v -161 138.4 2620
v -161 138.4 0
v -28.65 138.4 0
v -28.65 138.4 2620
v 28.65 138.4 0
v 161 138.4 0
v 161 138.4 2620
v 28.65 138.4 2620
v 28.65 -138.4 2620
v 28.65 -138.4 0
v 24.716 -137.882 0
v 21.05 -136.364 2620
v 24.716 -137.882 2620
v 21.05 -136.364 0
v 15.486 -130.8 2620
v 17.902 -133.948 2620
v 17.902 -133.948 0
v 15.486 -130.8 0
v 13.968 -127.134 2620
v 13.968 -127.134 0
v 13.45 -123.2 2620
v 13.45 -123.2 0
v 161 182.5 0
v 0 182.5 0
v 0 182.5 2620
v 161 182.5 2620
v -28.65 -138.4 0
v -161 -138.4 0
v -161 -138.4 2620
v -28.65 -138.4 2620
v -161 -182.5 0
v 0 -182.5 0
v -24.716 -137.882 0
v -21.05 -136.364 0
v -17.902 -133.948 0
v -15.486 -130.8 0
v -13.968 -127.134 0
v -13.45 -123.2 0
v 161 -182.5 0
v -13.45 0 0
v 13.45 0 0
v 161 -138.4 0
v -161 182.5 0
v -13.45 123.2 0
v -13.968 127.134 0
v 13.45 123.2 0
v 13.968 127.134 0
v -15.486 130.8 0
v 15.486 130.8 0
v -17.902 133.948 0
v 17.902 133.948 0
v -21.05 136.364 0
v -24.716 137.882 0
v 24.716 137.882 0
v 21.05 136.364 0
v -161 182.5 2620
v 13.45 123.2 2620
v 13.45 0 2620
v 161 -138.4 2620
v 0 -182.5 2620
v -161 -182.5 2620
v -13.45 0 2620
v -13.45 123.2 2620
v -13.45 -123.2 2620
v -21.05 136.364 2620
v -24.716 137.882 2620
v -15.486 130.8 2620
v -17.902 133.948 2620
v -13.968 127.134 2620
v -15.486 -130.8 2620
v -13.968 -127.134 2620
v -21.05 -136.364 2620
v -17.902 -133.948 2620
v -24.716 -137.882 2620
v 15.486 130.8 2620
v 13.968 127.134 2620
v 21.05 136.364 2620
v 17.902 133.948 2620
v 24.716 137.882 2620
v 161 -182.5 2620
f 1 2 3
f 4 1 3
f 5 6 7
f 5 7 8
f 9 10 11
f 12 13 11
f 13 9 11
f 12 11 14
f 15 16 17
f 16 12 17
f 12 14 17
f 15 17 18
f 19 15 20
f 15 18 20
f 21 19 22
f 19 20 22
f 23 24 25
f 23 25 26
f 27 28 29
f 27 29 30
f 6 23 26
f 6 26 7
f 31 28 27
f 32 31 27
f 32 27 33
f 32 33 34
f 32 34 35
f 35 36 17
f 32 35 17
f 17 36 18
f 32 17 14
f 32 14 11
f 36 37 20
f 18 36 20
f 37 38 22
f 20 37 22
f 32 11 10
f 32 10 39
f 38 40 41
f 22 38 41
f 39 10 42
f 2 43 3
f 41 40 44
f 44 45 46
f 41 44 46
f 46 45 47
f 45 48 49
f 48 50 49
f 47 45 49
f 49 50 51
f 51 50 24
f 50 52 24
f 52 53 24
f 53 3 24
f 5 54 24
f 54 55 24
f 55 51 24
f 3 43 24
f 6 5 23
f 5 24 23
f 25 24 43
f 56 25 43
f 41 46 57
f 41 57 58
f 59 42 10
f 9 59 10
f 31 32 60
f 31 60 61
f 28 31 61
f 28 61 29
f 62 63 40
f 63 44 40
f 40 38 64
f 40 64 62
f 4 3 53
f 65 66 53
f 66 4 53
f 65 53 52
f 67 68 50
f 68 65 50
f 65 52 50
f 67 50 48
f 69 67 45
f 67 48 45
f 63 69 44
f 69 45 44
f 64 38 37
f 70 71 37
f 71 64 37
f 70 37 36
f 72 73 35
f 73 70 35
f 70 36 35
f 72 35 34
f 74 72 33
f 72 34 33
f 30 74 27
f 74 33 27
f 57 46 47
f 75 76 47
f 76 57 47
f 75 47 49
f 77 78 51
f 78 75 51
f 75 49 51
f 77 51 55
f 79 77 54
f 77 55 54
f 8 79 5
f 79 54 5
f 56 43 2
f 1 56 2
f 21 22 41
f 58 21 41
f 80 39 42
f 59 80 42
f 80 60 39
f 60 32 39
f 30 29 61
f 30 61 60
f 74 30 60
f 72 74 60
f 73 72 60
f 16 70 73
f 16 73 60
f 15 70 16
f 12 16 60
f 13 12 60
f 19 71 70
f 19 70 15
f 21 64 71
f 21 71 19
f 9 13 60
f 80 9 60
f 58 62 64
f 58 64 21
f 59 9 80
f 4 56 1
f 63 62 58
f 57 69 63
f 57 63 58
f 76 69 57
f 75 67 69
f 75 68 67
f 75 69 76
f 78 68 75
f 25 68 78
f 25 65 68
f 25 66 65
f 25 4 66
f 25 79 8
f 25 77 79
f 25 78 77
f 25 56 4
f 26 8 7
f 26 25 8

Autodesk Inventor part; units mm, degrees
ref_plane "YZ Plane" through (0, 0, 0) normal (1, 0, 0) x (0, 1, 0)
ref_plane "Start plane" through (0, 0, 0) normal (0, 0, 1) x (1, 0, 0)
ref_plane "End plane" through (0, 0, 2620) normal (0, 0, 1) x (1, 0, 0)
sketch "Sketch" plane through (0, 0, 0) normal (0, 0, 1) x (1, 0, 0)
  line L0 (-161, -182.5) -> (-161, -138.4)
  line L1 (-161, -138.4) -> (-28.65, -138.4)
  line L2 (-13.45, -123.2) -> (-13.45, 0)
  line L3 (-13.45, 0) -> (0, 0) construction
  line L4 (0, 0) -> (0, -182.5) construction
  line L5 (0, -182.5) -> (-161, -182.5)
  line L6 (-60, 0) -> (80, 0) construction
  line L7 (0, -60) -> (0, 80) construction
  line L8 (161, -182.5) -> (161, -138.4)
  line L9 (161, -138.4) -> (28.65, -138.4)
  line L10 (13.45, -123.2) -> (13.45, 0)
  line L11 (13.45, 0) -> (0, 0) construction
  line L12 (0, -182.5) -> (161, -182.5)
  line L13 (-161, 182.5) -> (-161, 138.4)
  line L14 (-161, 138.4) -> (-28.65, 138.4)
  line L15 (-13.45, 123.2) -> (-13.45, 0)
  line L16 (0, 182.5) -> (-161, 182.5)
  line L17 (161, 182.5) -> (161, 138.4)
  line L18 (161, 138.4) -> (28.65, 138.4)
  line L19 (0, 182.5) -> (161, 182.5)
  line L20 (13.45, 123.2) -> (13.45, 0)
  arc A0 (-13.45, 123.2) -> (-28.65, 138.4) centre (-28.65, 123.2) ccw
  arc A1 (28.65, 138.4) -> (13.45, 123.2) centre (28.65, 123.2) ccw
  arc A2 (13.45, -123.2) -> (28.65, -138.4) centre (28.65, -123.2) ccw
  arc A3 (-28.65, -138.4) -> (-13.45, -123.2) centre (-28.65, -123.2) ccw
  line L21 (0, 108) -> (0, -88) construction
  line L22 (-88, 0) -> (108, 0) construction
  point P0 (-13.45, -138.4)
  point P1 (13.45, -138.4)
  point P2 (-13.45, 138.4)
  point P3 (13.45, 138.4)
  dimension "d1" = 182.5
  dimension "d2" = 44.1
  dimension "d3" = 161
  dimension "d4" = 13.45
  dimension "d10" = 15.2
extrude "Body" add sketch "Sketch" along normal up to surface (2620 mm away) from surface at 0
sketch "Sketch4" plane through (0, 0, 0) normal (0, 0, 1) x (1, 0, 0)
  line L0 (0, 0) -> (10, 0)
ref_plane "Work Plane3" through (0, 0, 0) normal (0, -1, 0) x (1, 0, 0)
sketch "Sketch5" plane through (0, 0, 0) normal (0, -1, 0) x (1, 0, 0)
  line L0 (-2, 0) -> (12, 0) projected
  line L1 (-2, 2620) -> (12, 2620) projected
  dimension "d14" = 2620
equation "\"d1\" = 0.5 * G_H"
equation "\"d2\" = G_T1"
equation "\"d3\" = 0.5 * G_W"
equation "\"d4\" = 0.5 * G_T"
equation "\"d10\" = G_IR"
equation "\"d5\" = G_L"
equation "\"G_W\" = 322"
equation "\"G_H\" = 365"
equation "\"G_T\" = 26.9"
equation "\"G_T1\" = 44.1"
equation "\"G_IR\" = 15.2"
equation "\"G_L\" = d14"
equation "\"G_OFFSET_START\" = 0"
equation "\"G_OFFSET_END\" = 0"
properties part number "AS 3679 - 310 UC - 283 - 2620" material "Steel, Mild"
